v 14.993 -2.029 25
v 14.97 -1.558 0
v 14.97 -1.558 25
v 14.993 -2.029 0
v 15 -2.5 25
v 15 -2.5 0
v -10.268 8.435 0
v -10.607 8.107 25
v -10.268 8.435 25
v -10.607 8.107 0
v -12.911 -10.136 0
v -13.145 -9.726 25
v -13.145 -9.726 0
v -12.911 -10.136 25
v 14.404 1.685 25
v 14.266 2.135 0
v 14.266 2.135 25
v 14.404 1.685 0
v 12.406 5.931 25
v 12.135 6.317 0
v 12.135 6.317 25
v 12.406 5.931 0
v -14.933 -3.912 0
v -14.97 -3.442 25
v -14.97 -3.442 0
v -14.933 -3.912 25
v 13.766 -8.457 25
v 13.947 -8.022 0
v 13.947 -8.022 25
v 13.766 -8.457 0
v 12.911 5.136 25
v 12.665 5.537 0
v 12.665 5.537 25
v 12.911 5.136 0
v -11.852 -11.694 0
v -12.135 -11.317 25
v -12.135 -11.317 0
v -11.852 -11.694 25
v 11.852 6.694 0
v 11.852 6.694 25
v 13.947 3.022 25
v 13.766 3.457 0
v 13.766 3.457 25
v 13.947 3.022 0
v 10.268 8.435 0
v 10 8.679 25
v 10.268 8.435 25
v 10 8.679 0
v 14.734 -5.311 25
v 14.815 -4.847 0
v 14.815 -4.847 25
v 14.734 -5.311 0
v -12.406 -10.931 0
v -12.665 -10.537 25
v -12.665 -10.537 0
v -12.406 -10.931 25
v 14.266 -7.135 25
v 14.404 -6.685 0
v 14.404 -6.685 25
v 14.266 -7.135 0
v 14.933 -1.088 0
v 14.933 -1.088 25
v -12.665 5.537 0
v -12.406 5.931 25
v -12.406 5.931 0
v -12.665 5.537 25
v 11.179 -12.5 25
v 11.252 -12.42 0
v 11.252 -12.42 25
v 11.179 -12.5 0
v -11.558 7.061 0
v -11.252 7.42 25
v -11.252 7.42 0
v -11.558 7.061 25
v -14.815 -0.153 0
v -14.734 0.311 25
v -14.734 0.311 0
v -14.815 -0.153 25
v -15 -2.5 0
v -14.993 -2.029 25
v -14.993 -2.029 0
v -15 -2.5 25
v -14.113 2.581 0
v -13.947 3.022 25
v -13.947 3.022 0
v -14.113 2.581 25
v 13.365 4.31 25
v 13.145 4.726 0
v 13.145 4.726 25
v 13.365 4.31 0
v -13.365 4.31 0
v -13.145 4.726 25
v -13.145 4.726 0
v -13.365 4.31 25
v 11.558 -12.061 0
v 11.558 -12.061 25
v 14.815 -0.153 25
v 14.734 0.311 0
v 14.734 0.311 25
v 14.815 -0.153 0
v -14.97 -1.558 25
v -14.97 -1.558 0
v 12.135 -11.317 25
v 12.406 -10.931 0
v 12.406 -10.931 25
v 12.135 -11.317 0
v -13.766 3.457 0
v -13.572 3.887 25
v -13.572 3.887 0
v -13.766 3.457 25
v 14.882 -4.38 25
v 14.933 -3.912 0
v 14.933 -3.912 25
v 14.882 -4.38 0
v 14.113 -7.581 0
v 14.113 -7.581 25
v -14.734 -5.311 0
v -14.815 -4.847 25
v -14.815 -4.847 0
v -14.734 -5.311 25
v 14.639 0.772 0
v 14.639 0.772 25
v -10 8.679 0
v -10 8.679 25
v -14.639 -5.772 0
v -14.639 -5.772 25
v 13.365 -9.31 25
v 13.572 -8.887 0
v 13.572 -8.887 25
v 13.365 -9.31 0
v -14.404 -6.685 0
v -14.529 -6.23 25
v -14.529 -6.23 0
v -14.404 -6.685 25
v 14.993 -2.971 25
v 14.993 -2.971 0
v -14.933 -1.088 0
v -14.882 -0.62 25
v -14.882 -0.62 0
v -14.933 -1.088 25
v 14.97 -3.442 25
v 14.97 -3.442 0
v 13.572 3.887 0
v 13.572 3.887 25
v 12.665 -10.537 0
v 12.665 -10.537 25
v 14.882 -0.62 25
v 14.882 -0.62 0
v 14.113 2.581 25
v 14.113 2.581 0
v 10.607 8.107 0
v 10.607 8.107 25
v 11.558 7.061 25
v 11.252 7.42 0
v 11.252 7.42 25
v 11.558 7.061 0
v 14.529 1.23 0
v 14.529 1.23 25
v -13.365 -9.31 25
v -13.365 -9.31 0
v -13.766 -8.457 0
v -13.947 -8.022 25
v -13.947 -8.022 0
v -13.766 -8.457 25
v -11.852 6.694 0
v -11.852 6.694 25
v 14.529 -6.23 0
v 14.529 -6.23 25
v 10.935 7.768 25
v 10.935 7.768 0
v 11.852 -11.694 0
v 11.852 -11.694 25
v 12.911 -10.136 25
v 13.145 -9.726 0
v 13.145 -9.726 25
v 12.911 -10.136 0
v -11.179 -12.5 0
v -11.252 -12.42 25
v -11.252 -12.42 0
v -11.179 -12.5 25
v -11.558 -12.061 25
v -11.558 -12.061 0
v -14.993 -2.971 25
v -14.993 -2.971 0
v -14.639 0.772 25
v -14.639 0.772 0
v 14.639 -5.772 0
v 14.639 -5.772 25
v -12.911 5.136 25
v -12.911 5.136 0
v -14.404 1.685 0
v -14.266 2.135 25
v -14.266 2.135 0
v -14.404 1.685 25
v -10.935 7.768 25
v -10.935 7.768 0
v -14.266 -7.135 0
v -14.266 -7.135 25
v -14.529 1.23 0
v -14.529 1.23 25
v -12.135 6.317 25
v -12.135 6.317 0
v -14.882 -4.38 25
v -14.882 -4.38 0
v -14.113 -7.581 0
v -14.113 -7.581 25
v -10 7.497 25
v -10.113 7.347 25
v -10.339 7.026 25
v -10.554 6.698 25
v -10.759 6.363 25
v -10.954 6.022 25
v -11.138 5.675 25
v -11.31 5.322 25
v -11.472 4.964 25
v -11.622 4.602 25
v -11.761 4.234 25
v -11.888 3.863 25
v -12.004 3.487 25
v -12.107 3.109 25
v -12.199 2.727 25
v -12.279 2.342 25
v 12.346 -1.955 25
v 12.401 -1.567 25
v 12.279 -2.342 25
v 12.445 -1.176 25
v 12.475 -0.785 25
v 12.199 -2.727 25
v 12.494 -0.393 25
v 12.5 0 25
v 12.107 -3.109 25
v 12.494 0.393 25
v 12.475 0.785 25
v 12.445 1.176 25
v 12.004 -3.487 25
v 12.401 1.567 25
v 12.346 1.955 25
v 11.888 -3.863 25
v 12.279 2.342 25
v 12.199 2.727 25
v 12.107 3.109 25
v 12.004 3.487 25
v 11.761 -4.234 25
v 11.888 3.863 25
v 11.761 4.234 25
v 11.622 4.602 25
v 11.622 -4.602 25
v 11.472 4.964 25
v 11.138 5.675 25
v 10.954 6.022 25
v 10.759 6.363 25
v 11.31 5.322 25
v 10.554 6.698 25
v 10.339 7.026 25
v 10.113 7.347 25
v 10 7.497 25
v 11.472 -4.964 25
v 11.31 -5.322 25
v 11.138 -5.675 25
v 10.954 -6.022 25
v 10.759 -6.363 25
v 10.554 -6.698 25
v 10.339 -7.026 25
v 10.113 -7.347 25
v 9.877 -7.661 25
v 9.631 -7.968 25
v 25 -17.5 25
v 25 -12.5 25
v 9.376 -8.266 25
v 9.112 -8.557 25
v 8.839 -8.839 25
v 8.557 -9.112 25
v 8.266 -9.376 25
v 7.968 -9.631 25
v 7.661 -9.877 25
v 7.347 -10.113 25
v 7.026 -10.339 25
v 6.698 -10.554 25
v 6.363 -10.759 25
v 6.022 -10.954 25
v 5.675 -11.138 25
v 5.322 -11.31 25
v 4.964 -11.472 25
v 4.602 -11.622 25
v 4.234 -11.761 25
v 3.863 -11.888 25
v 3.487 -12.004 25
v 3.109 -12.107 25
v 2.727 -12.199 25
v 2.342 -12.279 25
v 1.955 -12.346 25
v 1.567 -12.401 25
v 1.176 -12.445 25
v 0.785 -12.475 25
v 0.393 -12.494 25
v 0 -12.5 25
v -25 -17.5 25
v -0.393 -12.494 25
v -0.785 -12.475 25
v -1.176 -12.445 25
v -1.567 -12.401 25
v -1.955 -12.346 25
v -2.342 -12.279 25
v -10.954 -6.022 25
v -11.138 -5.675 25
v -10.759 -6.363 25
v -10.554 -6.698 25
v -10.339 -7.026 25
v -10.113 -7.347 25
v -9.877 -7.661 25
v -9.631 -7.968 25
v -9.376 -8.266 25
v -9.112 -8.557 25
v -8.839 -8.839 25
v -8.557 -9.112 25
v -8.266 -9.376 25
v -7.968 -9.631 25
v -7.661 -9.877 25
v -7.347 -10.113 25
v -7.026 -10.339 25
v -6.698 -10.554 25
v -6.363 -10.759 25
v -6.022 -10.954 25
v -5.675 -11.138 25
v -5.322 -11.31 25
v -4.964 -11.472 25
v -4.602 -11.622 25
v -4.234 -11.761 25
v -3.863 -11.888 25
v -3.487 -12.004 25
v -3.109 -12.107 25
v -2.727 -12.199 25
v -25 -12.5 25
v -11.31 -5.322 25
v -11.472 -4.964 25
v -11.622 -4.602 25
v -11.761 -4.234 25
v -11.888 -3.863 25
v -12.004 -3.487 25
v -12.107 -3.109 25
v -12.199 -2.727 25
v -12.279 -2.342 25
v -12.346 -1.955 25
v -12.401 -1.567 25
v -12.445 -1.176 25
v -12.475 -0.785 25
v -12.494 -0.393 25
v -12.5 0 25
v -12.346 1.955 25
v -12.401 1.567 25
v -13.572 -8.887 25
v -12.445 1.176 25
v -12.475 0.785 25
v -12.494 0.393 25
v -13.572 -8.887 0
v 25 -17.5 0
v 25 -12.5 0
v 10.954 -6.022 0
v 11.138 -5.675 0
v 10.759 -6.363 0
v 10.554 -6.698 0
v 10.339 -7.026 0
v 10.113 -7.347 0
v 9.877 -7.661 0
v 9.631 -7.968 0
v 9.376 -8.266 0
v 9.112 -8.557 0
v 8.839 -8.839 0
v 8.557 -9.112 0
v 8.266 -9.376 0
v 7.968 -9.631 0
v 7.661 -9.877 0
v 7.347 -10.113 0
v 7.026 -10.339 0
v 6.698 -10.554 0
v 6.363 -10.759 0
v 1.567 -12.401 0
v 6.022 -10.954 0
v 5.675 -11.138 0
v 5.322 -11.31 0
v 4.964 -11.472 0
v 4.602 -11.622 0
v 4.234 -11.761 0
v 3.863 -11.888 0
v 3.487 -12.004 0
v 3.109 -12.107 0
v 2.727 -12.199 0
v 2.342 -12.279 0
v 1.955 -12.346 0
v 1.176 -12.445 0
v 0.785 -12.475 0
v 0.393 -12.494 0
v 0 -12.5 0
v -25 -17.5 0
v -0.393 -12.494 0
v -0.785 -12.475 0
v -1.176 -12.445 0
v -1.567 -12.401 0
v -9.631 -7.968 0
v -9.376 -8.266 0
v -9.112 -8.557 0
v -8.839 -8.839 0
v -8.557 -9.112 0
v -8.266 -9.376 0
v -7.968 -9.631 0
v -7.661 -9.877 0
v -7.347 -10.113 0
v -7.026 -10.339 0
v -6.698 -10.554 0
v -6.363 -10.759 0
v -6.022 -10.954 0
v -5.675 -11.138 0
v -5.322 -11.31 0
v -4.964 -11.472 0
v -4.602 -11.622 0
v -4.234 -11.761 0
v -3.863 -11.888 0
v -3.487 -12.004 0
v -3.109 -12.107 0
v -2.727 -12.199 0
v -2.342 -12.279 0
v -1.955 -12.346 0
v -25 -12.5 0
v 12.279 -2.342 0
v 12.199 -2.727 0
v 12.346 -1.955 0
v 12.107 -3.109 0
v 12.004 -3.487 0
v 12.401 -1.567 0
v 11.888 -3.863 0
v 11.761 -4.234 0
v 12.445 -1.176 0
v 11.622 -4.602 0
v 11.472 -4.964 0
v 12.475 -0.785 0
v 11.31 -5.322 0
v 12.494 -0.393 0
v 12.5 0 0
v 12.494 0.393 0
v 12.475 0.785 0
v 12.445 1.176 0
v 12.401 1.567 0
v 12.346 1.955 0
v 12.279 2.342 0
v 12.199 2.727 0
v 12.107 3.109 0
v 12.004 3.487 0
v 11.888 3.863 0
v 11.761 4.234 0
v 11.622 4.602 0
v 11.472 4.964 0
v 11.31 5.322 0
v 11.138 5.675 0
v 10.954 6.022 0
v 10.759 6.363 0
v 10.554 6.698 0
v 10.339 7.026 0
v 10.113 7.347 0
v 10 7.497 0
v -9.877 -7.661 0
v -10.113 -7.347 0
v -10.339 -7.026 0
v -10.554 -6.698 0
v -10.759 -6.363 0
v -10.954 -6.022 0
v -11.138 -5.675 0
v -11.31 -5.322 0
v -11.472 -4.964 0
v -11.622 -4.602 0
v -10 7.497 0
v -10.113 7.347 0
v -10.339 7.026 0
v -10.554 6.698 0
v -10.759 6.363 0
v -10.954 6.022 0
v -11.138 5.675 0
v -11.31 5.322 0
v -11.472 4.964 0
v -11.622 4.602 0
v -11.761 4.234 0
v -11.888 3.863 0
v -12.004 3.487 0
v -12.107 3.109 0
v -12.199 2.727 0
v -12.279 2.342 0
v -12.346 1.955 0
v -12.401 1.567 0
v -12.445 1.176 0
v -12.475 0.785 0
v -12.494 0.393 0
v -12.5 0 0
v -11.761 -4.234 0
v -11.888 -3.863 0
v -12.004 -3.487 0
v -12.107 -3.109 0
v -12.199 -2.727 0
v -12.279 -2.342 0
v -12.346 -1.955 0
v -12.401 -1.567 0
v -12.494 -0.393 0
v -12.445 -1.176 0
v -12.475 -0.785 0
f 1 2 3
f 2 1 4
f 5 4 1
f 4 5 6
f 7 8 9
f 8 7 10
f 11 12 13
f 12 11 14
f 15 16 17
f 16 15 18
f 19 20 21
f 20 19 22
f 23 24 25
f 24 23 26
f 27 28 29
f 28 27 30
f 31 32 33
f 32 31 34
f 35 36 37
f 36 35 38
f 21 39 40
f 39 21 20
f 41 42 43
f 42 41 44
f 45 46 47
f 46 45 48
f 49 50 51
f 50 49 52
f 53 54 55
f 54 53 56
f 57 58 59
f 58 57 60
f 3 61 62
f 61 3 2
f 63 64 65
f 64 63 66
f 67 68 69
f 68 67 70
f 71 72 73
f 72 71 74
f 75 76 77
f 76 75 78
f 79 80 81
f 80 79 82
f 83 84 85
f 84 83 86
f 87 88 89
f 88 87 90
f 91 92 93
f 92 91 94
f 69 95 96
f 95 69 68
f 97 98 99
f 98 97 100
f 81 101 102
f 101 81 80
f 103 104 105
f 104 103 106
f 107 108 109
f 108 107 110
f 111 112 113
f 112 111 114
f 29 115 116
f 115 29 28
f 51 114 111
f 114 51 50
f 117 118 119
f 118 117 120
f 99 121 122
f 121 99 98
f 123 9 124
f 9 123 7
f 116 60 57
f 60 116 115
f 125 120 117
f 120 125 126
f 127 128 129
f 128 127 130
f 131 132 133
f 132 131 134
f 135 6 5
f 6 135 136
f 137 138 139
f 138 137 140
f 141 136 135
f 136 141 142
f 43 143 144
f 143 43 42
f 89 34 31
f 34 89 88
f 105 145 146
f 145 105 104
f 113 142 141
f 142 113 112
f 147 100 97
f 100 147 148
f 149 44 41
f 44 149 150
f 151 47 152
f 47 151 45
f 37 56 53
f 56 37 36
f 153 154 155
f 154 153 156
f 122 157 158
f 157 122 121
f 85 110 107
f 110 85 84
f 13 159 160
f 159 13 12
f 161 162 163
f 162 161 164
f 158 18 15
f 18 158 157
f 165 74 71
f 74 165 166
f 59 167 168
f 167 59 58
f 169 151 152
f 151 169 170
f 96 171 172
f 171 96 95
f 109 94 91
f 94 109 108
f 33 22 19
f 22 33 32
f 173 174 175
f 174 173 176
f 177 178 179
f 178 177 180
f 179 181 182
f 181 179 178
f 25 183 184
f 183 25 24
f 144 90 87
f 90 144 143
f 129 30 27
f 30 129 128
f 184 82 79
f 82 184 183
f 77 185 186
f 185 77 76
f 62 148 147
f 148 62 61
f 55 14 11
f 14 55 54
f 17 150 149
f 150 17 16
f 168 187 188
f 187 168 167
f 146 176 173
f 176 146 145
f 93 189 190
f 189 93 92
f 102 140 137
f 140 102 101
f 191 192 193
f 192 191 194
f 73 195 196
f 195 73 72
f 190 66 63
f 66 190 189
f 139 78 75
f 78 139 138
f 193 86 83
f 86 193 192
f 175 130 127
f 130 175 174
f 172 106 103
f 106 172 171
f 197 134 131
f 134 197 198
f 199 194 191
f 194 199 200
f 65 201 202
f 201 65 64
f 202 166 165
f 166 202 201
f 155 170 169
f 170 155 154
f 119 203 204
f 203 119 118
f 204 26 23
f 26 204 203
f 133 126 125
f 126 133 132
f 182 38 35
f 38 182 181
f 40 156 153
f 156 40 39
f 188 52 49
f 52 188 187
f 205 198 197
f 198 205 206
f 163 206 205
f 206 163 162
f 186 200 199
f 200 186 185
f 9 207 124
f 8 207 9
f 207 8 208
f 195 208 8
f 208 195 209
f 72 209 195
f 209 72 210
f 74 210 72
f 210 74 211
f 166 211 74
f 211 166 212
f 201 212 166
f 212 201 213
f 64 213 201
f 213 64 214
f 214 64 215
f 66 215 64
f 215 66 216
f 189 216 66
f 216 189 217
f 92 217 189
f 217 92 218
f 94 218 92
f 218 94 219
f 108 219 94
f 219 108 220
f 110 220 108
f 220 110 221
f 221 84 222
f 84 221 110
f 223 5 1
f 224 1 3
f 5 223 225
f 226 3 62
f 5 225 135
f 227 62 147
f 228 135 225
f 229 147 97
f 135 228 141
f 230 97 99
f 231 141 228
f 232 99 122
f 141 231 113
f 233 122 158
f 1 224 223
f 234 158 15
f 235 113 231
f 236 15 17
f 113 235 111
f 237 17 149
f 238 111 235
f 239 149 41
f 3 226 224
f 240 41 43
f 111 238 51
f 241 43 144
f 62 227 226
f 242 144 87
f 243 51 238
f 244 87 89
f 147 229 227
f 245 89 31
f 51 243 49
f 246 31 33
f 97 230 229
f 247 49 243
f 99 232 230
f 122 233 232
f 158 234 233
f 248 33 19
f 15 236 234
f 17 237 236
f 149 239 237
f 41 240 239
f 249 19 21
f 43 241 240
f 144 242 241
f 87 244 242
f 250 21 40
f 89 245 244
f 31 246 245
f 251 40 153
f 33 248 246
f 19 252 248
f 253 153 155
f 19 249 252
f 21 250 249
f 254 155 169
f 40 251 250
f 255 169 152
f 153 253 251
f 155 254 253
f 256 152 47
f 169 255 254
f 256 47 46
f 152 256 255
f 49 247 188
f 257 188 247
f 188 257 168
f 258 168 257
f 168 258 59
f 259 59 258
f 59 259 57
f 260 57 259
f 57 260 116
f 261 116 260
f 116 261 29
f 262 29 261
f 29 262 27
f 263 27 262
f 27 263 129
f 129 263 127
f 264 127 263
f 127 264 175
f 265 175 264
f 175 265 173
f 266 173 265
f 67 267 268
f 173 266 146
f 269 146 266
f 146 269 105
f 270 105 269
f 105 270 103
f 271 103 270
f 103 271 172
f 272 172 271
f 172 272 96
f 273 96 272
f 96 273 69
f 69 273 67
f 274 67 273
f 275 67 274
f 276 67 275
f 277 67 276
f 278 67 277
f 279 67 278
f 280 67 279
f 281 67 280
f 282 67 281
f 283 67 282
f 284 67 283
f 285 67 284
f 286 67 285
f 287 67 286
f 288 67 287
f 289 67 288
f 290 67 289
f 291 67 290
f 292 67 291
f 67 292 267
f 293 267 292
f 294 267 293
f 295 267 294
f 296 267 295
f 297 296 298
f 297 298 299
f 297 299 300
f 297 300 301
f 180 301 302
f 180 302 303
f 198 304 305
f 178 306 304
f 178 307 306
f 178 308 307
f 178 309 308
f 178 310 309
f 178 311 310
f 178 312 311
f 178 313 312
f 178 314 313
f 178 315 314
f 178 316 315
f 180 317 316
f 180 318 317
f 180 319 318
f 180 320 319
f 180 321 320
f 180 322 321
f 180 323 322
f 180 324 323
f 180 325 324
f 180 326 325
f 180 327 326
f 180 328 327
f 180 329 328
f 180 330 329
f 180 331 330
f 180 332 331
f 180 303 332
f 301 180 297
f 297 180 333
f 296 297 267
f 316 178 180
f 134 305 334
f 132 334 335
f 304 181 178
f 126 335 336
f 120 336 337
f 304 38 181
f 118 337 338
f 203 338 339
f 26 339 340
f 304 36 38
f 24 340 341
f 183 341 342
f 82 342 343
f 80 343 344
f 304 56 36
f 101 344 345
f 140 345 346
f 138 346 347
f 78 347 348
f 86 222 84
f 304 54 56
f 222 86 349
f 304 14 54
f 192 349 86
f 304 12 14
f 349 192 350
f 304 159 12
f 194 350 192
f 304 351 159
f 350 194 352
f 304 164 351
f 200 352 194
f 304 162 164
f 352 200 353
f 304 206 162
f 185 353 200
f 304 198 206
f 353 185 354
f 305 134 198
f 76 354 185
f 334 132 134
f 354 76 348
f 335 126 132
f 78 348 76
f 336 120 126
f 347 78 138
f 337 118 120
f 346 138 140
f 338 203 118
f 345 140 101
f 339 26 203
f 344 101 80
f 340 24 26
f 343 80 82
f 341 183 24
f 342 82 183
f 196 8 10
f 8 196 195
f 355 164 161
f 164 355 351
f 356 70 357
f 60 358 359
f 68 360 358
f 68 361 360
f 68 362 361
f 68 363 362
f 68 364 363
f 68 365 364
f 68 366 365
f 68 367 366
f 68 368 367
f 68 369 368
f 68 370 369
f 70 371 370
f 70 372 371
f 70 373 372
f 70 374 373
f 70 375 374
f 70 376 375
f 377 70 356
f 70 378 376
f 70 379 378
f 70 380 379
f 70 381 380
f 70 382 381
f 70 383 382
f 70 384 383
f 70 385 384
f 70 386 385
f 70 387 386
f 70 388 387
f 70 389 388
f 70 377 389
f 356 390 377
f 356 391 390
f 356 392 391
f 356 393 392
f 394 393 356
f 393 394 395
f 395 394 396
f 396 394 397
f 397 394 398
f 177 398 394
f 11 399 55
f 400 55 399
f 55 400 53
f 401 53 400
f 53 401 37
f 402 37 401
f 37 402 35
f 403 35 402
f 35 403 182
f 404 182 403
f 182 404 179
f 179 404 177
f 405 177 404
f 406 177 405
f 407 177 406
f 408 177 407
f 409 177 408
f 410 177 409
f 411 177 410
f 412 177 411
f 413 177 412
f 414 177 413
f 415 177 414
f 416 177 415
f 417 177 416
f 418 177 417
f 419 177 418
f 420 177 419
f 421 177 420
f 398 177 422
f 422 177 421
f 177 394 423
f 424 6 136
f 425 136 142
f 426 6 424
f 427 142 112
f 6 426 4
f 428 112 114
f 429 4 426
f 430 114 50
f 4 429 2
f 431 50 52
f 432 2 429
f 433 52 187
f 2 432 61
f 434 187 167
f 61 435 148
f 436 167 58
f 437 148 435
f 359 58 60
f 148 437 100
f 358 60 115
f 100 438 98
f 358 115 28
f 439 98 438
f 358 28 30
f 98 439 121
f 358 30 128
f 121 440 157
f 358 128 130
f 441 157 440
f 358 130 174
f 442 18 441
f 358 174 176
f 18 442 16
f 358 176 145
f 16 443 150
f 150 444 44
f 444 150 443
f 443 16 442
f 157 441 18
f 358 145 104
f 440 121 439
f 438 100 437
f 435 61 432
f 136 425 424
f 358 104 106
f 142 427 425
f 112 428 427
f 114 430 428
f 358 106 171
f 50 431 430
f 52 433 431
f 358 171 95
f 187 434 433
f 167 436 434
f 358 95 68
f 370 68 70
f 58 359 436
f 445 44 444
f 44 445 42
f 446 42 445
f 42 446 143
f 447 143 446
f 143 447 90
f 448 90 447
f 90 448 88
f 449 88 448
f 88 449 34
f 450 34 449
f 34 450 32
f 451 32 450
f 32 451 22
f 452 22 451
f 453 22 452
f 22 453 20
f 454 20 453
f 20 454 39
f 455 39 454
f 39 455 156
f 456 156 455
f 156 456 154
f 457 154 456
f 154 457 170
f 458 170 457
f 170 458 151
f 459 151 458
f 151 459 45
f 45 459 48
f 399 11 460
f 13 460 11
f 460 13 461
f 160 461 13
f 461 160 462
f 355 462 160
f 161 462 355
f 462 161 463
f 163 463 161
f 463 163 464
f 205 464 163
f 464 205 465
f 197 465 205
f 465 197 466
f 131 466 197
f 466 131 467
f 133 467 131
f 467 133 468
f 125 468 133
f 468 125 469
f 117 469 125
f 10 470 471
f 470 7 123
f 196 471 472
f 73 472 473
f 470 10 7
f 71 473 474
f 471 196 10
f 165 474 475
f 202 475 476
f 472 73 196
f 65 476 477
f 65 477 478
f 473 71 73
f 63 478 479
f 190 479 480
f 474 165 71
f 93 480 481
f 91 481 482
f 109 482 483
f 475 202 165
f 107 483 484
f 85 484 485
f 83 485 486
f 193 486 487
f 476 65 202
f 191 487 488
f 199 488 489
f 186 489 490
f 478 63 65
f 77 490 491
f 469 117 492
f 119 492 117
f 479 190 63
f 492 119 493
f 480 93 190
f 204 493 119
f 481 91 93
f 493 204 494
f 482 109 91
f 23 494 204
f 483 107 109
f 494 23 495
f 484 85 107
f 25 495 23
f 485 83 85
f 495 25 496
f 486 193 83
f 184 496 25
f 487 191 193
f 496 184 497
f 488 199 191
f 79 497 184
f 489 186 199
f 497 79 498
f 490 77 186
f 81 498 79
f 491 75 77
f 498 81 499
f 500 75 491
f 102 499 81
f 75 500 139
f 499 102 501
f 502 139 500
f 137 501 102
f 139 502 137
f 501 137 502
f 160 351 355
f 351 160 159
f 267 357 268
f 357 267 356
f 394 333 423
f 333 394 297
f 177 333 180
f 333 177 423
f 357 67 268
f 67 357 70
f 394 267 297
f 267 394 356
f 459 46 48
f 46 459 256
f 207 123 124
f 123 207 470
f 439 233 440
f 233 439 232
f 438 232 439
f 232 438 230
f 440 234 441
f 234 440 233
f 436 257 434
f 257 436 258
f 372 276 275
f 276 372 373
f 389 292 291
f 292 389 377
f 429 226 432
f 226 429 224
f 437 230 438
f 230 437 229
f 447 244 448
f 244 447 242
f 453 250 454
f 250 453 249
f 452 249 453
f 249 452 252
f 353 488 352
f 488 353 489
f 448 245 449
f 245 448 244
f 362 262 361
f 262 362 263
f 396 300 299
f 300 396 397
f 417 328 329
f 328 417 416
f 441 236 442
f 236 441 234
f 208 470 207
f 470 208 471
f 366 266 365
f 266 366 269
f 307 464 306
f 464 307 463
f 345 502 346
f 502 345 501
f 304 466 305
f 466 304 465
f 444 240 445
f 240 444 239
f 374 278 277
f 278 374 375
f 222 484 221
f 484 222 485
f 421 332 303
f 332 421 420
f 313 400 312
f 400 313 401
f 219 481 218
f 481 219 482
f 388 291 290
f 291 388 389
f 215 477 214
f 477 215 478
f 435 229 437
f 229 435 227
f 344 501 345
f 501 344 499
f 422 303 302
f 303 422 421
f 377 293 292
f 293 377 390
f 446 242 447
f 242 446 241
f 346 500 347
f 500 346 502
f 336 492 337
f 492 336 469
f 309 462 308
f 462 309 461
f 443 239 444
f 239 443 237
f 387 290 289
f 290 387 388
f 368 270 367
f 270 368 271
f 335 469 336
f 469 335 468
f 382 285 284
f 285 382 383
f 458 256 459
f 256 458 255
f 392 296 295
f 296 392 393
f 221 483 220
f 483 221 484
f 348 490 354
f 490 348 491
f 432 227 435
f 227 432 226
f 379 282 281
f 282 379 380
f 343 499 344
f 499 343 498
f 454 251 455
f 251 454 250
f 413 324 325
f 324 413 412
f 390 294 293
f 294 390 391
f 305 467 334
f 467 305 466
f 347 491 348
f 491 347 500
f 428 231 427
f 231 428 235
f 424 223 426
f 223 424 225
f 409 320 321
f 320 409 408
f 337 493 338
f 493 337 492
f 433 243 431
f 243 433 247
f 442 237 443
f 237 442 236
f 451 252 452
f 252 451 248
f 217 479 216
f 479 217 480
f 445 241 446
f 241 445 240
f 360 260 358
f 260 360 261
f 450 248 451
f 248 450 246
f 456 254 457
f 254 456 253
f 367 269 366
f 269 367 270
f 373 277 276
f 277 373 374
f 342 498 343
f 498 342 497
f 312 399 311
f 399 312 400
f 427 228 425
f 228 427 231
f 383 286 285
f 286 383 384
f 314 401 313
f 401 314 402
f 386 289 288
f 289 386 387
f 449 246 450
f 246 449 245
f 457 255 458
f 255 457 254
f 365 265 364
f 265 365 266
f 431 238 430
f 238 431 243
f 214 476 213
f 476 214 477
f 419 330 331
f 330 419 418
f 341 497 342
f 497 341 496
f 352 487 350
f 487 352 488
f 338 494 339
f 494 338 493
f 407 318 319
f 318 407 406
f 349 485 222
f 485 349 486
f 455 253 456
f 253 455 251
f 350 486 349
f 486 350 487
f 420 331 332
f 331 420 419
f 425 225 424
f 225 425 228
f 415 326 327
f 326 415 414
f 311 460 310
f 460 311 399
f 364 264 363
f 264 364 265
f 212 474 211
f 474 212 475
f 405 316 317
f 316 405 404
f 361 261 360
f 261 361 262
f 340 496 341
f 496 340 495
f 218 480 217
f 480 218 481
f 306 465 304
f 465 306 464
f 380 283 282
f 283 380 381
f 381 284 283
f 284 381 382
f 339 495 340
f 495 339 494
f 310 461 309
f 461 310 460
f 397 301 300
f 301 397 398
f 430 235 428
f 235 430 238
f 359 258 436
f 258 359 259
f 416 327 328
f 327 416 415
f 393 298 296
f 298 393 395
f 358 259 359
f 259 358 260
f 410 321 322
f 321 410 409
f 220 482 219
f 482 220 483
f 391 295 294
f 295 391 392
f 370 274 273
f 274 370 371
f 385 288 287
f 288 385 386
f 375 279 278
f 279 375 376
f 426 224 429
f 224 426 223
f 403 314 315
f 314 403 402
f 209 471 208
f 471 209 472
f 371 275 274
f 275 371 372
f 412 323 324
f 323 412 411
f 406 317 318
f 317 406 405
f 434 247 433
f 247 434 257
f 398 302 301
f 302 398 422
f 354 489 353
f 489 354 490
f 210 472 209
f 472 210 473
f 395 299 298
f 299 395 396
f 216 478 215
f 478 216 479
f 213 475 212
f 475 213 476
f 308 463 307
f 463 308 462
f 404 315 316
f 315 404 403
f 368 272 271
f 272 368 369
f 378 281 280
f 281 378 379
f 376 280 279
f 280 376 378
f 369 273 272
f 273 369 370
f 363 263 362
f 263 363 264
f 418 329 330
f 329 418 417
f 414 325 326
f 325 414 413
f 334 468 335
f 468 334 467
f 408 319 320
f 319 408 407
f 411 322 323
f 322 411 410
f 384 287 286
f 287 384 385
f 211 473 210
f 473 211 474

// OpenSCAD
diameter = 25;
width = 25;
length = 50;
opening = 0.8;

rotate([0,0,0]){
    difference(){
        union(){
            translate([0,diameter*-0.1,0]) cylinder(h=width,d=diameter*1.2,$fn=200);
            translate([0,diameter*-0.6,width*0.5]) cube([length,diameter*0.2,width],center=true);
        }    
        union(){
            translate([0,diameter*0.25,width*0.5]) cube([diameter*opening,diameter*0.5,width],center=true);
            cylinder(h=width,d=diameter,$fn=200);
        }
    }    
}
